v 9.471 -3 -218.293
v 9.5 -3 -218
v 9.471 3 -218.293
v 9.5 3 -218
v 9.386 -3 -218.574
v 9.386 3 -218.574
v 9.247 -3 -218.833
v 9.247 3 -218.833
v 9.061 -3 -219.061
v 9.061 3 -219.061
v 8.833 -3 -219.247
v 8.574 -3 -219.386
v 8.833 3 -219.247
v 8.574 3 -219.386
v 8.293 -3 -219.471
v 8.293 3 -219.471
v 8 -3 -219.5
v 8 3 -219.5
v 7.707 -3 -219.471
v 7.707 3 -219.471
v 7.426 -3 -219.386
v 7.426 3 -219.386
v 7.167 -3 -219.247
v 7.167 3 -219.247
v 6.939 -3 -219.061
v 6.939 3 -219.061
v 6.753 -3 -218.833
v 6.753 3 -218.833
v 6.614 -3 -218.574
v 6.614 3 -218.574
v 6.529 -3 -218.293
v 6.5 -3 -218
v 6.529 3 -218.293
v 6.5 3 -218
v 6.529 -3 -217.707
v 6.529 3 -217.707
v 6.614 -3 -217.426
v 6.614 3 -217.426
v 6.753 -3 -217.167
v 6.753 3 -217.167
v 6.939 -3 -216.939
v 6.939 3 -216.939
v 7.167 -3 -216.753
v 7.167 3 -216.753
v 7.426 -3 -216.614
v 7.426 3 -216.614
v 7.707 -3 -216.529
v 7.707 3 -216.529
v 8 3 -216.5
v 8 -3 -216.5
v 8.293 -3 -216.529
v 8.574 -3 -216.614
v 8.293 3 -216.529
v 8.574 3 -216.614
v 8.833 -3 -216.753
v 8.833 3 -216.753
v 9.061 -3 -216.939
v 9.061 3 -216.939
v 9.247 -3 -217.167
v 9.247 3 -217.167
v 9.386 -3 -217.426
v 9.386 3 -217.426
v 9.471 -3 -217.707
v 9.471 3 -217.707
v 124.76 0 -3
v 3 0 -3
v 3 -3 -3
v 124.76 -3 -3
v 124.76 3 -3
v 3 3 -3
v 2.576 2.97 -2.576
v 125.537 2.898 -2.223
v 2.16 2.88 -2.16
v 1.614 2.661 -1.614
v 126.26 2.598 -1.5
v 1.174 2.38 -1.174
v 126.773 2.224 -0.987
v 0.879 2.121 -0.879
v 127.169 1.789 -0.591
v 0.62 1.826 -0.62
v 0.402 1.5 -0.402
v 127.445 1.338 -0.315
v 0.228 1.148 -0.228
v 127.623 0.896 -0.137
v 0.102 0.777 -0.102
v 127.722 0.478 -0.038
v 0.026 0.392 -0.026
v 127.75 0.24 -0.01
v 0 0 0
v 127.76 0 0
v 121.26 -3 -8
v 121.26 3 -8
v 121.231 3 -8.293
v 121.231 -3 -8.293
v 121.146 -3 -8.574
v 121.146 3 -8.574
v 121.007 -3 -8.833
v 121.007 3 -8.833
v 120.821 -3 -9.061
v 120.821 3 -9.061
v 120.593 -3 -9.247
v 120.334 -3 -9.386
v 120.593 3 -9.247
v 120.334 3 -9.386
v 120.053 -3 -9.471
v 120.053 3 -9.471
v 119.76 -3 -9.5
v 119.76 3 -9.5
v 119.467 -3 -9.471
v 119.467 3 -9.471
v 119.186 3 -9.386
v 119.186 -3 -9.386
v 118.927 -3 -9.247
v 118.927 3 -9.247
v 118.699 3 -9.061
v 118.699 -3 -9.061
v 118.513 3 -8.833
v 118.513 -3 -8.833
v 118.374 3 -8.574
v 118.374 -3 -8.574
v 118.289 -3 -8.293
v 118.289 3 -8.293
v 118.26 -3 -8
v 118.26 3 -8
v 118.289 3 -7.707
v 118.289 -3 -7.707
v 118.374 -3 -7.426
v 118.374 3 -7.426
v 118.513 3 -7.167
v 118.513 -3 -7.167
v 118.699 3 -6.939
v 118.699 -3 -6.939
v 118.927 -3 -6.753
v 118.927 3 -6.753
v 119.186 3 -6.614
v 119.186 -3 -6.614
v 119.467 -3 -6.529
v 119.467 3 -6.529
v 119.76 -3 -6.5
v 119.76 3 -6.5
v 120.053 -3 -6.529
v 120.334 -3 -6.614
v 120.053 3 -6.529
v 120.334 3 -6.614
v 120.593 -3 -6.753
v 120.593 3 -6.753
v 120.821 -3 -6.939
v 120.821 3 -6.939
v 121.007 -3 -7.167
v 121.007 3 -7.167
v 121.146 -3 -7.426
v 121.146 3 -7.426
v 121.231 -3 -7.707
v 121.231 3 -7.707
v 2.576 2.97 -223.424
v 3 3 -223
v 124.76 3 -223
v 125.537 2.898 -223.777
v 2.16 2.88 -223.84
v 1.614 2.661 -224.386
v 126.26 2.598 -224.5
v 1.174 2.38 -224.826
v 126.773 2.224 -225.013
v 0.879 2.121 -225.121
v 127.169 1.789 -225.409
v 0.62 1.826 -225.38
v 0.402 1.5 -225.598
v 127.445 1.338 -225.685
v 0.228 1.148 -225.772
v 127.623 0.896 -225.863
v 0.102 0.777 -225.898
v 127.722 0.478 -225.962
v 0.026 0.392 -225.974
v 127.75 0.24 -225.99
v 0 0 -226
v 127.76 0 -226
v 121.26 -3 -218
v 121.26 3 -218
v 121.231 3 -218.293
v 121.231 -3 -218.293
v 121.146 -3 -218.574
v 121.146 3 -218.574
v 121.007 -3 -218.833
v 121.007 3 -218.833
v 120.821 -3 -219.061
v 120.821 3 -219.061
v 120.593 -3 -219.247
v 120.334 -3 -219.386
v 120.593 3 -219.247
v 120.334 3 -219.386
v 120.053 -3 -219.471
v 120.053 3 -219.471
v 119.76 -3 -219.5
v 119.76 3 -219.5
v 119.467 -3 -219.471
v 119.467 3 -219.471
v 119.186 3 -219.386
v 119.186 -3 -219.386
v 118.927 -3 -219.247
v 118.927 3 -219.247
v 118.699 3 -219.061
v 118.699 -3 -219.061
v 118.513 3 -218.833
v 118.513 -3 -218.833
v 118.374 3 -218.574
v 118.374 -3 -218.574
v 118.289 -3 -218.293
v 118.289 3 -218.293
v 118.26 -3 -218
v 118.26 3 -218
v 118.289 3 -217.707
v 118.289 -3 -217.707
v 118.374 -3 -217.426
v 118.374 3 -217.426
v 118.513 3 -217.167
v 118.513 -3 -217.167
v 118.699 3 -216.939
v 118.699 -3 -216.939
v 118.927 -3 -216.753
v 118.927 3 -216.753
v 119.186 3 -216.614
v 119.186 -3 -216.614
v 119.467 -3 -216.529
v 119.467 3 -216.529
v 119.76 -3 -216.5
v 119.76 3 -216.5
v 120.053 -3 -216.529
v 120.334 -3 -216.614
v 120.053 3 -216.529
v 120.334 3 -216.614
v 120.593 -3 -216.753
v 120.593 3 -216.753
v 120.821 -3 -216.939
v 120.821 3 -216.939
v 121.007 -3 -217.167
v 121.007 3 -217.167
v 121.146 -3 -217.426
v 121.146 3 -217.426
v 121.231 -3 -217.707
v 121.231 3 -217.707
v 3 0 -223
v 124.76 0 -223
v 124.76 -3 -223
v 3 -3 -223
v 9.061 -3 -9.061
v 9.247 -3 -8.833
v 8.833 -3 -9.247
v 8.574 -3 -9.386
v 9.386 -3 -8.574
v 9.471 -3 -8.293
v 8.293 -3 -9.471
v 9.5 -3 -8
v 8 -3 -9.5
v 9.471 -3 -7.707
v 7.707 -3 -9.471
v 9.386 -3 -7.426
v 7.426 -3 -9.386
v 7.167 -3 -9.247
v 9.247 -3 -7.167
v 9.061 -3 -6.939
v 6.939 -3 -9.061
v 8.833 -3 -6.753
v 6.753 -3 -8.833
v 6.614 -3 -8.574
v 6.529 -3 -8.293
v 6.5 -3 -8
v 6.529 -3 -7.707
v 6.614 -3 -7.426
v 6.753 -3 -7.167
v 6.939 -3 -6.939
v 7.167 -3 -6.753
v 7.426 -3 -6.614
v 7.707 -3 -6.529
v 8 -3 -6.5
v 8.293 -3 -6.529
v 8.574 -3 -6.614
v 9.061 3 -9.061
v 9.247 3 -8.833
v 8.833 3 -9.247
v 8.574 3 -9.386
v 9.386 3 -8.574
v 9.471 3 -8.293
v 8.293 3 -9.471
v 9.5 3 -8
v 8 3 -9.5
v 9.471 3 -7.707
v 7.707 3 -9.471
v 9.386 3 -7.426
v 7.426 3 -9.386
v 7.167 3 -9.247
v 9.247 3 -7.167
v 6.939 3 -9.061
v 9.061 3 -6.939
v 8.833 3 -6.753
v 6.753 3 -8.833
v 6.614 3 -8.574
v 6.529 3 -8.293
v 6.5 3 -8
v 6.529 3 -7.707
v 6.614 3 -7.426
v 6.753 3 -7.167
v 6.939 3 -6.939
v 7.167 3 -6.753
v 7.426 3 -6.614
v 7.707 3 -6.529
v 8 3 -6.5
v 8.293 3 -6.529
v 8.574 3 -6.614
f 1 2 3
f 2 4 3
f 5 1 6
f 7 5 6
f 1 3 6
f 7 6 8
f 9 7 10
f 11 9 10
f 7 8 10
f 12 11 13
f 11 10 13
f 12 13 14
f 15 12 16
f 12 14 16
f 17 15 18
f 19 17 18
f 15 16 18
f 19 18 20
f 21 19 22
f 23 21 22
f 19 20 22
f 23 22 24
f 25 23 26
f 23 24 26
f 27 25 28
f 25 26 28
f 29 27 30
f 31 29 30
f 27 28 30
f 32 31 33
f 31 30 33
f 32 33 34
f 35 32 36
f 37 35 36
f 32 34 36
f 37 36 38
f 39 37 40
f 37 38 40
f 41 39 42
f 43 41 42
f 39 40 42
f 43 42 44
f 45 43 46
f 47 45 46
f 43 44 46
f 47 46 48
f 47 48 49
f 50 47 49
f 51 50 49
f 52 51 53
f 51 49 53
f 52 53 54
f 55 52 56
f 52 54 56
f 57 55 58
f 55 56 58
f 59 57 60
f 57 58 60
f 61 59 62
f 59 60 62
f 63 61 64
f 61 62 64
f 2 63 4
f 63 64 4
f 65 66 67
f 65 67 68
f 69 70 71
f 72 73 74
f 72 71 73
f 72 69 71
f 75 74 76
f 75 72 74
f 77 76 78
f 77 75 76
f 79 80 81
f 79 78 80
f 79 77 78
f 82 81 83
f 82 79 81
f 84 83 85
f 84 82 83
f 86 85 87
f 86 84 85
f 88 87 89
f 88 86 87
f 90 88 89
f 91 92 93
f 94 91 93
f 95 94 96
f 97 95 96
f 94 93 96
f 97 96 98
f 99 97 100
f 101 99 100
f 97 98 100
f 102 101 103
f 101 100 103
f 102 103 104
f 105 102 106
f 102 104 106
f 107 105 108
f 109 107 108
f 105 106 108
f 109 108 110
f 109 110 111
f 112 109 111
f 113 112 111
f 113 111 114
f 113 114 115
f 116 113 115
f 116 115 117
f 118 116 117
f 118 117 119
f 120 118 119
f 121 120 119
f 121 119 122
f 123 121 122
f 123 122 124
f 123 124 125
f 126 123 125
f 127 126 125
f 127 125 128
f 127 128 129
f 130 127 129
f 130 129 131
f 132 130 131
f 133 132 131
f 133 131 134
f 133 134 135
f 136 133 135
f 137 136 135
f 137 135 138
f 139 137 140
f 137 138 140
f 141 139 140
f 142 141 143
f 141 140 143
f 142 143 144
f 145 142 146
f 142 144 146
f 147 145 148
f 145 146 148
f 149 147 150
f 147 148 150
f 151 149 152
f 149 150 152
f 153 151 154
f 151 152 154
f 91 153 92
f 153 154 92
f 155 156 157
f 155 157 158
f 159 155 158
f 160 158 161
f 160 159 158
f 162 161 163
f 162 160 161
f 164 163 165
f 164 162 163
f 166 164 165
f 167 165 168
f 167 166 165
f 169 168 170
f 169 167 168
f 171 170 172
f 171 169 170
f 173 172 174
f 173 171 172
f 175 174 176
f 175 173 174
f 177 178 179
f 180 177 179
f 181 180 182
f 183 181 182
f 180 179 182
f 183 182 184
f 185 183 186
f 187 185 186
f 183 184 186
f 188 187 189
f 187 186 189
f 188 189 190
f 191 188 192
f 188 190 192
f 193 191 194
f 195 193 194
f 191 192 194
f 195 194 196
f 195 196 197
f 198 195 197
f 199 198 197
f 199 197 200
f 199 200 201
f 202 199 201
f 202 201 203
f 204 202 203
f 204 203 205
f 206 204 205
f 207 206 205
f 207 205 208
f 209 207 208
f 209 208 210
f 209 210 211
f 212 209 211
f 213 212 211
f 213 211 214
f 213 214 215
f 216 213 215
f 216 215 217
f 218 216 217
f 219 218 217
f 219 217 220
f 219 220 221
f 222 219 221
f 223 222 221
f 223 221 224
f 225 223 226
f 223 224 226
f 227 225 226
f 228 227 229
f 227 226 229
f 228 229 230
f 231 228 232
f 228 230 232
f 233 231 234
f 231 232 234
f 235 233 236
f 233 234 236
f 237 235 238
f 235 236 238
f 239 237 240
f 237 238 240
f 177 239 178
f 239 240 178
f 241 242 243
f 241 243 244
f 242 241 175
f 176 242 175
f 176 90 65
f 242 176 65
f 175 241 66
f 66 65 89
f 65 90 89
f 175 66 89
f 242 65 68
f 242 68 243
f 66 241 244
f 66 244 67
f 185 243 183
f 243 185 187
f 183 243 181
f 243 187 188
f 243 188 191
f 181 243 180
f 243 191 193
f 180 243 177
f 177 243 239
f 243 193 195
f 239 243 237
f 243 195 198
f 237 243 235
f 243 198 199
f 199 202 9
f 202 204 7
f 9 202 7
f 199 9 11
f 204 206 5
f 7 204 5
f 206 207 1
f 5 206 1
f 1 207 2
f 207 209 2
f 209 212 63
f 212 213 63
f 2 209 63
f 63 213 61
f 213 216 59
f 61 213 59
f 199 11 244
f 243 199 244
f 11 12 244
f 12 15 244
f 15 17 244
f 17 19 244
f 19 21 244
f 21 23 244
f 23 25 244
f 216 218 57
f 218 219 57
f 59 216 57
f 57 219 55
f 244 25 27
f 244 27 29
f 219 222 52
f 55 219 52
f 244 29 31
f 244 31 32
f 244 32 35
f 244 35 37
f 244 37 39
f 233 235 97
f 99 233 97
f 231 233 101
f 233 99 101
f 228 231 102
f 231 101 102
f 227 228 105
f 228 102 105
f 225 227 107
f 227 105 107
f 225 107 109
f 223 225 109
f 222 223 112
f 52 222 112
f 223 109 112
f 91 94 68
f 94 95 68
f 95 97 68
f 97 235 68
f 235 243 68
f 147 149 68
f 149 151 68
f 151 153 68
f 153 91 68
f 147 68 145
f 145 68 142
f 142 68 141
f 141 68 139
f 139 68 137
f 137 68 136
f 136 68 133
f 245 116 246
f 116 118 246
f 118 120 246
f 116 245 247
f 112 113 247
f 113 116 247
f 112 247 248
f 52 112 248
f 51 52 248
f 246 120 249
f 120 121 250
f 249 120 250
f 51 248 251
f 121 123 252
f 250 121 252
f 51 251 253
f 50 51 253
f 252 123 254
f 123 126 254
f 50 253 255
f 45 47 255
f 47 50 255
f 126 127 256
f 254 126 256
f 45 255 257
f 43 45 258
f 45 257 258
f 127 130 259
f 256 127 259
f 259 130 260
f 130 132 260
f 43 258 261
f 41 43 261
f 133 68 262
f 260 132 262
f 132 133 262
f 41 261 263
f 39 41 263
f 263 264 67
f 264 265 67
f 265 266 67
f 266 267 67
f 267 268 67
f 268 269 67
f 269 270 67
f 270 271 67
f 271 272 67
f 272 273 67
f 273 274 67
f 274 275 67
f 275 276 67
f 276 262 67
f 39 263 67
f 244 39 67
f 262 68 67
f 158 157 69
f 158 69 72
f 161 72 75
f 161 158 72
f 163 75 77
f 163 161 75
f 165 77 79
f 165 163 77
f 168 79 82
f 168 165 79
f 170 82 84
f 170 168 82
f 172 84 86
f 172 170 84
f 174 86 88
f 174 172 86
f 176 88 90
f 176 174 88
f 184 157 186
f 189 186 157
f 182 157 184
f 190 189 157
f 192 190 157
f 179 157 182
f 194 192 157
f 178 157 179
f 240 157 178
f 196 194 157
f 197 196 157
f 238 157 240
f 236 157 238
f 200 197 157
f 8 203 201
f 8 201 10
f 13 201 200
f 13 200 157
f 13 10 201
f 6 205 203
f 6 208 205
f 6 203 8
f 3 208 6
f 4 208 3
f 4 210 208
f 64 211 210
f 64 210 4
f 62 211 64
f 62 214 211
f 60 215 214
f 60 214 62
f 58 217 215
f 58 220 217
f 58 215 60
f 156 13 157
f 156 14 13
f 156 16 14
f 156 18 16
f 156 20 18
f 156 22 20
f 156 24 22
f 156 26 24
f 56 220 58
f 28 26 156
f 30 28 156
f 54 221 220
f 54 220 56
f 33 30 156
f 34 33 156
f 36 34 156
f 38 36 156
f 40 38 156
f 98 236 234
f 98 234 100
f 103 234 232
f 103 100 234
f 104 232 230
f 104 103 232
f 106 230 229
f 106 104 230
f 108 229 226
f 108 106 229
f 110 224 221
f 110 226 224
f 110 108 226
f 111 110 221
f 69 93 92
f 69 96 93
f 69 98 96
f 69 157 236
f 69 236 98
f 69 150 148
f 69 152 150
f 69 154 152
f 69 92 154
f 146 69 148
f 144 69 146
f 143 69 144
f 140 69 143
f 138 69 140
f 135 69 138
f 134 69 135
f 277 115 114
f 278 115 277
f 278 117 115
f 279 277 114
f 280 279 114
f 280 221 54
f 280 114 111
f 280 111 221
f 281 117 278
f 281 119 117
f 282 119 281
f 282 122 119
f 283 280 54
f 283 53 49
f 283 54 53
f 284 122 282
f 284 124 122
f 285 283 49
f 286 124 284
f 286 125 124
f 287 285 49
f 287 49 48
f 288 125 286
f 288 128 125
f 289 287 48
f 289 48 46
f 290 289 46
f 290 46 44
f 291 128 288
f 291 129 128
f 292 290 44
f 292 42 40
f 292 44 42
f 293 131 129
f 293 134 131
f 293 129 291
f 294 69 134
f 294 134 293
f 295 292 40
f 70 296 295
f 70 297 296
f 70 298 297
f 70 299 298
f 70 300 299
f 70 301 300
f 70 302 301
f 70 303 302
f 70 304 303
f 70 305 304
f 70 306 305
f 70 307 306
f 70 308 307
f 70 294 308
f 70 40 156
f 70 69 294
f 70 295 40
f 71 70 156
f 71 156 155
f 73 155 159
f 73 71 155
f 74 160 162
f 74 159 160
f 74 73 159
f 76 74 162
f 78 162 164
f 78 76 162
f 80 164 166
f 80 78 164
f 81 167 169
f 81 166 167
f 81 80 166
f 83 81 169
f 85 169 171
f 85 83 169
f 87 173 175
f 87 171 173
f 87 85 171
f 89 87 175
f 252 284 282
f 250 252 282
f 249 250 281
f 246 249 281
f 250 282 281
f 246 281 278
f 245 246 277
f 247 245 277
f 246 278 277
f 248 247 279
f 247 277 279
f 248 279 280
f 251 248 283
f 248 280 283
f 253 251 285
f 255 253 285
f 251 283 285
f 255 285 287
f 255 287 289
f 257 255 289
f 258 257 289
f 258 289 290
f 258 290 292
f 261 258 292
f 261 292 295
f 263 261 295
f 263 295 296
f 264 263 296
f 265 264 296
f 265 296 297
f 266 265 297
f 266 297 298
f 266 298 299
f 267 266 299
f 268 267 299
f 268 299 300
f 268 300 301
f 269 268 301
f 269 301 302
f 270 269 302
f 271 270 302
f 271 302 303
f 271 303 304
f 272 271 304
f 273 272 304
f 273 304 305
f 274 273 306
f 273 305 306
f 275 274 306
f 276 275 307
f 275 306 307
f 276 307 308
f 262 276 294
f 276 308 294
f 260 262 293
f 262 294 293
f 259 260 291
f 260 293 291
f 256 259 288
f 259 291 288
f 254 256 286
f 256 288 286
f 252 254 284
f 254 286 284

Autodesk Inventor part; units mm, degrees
ref_plane "YZ Plane" through (0, 0, 0) normal (1, 0, 0) x (0, 1, 0)
ref_plane "XZ Plane" through (0, 0, 0) normal (0, 1, 0) x (-1, 0, 0)
ref_plane "XY Plane" through (0, 0, 0) normal (0, 0, 1) x (1, 0, 0)
sketch "Sketch1" plane through (0, 0, 0) normal (0, 1, 0) x (-1, 0, 0)
  line L0 (0, 0) -> (-127.76, 0)
  line L1 (-127.76, 0) -> (-127.76, -226)
  line L2 (-127.76, -226) -> (0, -226)
  line L3 (0, -226) -> (0, 0)
  line L4 (-3, -3) -> (-124.76, -3)
  line L5 (-124.76, -3) -> (-124.76, -223)
  line L6 (-124.76, -223) -> (-3, -223)
  line L7 (-3, -223) -> (-3, -3)
  dimension "d0" = 127.76
  dimension "d1" = 226
  dimension "d2" = 3
extrude "Extrusion1" add sketch "Sketch1" against normal blind 3 contours L7 L6 L5 L4
extrude "Extrusion2" add sketch "Sketch1" along normal blind 3 contours L3 L2 L1 L0 | L7 L6 L5 L4
sketch "Sketch2" plane through (0, 3, 0) normal (0, 1, 0) x (1, 0, 0)
  line L0 (0, 226) -> (0, 0) projected
  line L1 (0, 113) -> (127.76, 113) construction
  line L2 (127.76, 0) -> (127.76, 226) projected
  line L3 (0, 0) -> (127.76, 0) projected
  line L4 (63.88, 0) -> (63.88, 226) construction
  line L5 (127.76, 226) -> (0, 226) projected
  circle A0 centre (119.76, 8) radius 1.5
  circle A1 centre (8, 8) radius 1.5
  circle A2 centre (119.76, 218) radius 1.5
  circle A3 centre (8, 218) radius 1.5
  dimension "d7" = 3
  dimension "d8" = 8
  dimension "d9" = 8
extrude "Extrusion3" cut sketch "Sketch2" against normal through all contours A0 | A1 | A2 | A3
fillet "Fillet1" radius 3 4 edges at (127.76, 3, -113) (63.88, 3, -226) (0, 3, -113) (63.88, 3, 0)
properties part number "Lid"
